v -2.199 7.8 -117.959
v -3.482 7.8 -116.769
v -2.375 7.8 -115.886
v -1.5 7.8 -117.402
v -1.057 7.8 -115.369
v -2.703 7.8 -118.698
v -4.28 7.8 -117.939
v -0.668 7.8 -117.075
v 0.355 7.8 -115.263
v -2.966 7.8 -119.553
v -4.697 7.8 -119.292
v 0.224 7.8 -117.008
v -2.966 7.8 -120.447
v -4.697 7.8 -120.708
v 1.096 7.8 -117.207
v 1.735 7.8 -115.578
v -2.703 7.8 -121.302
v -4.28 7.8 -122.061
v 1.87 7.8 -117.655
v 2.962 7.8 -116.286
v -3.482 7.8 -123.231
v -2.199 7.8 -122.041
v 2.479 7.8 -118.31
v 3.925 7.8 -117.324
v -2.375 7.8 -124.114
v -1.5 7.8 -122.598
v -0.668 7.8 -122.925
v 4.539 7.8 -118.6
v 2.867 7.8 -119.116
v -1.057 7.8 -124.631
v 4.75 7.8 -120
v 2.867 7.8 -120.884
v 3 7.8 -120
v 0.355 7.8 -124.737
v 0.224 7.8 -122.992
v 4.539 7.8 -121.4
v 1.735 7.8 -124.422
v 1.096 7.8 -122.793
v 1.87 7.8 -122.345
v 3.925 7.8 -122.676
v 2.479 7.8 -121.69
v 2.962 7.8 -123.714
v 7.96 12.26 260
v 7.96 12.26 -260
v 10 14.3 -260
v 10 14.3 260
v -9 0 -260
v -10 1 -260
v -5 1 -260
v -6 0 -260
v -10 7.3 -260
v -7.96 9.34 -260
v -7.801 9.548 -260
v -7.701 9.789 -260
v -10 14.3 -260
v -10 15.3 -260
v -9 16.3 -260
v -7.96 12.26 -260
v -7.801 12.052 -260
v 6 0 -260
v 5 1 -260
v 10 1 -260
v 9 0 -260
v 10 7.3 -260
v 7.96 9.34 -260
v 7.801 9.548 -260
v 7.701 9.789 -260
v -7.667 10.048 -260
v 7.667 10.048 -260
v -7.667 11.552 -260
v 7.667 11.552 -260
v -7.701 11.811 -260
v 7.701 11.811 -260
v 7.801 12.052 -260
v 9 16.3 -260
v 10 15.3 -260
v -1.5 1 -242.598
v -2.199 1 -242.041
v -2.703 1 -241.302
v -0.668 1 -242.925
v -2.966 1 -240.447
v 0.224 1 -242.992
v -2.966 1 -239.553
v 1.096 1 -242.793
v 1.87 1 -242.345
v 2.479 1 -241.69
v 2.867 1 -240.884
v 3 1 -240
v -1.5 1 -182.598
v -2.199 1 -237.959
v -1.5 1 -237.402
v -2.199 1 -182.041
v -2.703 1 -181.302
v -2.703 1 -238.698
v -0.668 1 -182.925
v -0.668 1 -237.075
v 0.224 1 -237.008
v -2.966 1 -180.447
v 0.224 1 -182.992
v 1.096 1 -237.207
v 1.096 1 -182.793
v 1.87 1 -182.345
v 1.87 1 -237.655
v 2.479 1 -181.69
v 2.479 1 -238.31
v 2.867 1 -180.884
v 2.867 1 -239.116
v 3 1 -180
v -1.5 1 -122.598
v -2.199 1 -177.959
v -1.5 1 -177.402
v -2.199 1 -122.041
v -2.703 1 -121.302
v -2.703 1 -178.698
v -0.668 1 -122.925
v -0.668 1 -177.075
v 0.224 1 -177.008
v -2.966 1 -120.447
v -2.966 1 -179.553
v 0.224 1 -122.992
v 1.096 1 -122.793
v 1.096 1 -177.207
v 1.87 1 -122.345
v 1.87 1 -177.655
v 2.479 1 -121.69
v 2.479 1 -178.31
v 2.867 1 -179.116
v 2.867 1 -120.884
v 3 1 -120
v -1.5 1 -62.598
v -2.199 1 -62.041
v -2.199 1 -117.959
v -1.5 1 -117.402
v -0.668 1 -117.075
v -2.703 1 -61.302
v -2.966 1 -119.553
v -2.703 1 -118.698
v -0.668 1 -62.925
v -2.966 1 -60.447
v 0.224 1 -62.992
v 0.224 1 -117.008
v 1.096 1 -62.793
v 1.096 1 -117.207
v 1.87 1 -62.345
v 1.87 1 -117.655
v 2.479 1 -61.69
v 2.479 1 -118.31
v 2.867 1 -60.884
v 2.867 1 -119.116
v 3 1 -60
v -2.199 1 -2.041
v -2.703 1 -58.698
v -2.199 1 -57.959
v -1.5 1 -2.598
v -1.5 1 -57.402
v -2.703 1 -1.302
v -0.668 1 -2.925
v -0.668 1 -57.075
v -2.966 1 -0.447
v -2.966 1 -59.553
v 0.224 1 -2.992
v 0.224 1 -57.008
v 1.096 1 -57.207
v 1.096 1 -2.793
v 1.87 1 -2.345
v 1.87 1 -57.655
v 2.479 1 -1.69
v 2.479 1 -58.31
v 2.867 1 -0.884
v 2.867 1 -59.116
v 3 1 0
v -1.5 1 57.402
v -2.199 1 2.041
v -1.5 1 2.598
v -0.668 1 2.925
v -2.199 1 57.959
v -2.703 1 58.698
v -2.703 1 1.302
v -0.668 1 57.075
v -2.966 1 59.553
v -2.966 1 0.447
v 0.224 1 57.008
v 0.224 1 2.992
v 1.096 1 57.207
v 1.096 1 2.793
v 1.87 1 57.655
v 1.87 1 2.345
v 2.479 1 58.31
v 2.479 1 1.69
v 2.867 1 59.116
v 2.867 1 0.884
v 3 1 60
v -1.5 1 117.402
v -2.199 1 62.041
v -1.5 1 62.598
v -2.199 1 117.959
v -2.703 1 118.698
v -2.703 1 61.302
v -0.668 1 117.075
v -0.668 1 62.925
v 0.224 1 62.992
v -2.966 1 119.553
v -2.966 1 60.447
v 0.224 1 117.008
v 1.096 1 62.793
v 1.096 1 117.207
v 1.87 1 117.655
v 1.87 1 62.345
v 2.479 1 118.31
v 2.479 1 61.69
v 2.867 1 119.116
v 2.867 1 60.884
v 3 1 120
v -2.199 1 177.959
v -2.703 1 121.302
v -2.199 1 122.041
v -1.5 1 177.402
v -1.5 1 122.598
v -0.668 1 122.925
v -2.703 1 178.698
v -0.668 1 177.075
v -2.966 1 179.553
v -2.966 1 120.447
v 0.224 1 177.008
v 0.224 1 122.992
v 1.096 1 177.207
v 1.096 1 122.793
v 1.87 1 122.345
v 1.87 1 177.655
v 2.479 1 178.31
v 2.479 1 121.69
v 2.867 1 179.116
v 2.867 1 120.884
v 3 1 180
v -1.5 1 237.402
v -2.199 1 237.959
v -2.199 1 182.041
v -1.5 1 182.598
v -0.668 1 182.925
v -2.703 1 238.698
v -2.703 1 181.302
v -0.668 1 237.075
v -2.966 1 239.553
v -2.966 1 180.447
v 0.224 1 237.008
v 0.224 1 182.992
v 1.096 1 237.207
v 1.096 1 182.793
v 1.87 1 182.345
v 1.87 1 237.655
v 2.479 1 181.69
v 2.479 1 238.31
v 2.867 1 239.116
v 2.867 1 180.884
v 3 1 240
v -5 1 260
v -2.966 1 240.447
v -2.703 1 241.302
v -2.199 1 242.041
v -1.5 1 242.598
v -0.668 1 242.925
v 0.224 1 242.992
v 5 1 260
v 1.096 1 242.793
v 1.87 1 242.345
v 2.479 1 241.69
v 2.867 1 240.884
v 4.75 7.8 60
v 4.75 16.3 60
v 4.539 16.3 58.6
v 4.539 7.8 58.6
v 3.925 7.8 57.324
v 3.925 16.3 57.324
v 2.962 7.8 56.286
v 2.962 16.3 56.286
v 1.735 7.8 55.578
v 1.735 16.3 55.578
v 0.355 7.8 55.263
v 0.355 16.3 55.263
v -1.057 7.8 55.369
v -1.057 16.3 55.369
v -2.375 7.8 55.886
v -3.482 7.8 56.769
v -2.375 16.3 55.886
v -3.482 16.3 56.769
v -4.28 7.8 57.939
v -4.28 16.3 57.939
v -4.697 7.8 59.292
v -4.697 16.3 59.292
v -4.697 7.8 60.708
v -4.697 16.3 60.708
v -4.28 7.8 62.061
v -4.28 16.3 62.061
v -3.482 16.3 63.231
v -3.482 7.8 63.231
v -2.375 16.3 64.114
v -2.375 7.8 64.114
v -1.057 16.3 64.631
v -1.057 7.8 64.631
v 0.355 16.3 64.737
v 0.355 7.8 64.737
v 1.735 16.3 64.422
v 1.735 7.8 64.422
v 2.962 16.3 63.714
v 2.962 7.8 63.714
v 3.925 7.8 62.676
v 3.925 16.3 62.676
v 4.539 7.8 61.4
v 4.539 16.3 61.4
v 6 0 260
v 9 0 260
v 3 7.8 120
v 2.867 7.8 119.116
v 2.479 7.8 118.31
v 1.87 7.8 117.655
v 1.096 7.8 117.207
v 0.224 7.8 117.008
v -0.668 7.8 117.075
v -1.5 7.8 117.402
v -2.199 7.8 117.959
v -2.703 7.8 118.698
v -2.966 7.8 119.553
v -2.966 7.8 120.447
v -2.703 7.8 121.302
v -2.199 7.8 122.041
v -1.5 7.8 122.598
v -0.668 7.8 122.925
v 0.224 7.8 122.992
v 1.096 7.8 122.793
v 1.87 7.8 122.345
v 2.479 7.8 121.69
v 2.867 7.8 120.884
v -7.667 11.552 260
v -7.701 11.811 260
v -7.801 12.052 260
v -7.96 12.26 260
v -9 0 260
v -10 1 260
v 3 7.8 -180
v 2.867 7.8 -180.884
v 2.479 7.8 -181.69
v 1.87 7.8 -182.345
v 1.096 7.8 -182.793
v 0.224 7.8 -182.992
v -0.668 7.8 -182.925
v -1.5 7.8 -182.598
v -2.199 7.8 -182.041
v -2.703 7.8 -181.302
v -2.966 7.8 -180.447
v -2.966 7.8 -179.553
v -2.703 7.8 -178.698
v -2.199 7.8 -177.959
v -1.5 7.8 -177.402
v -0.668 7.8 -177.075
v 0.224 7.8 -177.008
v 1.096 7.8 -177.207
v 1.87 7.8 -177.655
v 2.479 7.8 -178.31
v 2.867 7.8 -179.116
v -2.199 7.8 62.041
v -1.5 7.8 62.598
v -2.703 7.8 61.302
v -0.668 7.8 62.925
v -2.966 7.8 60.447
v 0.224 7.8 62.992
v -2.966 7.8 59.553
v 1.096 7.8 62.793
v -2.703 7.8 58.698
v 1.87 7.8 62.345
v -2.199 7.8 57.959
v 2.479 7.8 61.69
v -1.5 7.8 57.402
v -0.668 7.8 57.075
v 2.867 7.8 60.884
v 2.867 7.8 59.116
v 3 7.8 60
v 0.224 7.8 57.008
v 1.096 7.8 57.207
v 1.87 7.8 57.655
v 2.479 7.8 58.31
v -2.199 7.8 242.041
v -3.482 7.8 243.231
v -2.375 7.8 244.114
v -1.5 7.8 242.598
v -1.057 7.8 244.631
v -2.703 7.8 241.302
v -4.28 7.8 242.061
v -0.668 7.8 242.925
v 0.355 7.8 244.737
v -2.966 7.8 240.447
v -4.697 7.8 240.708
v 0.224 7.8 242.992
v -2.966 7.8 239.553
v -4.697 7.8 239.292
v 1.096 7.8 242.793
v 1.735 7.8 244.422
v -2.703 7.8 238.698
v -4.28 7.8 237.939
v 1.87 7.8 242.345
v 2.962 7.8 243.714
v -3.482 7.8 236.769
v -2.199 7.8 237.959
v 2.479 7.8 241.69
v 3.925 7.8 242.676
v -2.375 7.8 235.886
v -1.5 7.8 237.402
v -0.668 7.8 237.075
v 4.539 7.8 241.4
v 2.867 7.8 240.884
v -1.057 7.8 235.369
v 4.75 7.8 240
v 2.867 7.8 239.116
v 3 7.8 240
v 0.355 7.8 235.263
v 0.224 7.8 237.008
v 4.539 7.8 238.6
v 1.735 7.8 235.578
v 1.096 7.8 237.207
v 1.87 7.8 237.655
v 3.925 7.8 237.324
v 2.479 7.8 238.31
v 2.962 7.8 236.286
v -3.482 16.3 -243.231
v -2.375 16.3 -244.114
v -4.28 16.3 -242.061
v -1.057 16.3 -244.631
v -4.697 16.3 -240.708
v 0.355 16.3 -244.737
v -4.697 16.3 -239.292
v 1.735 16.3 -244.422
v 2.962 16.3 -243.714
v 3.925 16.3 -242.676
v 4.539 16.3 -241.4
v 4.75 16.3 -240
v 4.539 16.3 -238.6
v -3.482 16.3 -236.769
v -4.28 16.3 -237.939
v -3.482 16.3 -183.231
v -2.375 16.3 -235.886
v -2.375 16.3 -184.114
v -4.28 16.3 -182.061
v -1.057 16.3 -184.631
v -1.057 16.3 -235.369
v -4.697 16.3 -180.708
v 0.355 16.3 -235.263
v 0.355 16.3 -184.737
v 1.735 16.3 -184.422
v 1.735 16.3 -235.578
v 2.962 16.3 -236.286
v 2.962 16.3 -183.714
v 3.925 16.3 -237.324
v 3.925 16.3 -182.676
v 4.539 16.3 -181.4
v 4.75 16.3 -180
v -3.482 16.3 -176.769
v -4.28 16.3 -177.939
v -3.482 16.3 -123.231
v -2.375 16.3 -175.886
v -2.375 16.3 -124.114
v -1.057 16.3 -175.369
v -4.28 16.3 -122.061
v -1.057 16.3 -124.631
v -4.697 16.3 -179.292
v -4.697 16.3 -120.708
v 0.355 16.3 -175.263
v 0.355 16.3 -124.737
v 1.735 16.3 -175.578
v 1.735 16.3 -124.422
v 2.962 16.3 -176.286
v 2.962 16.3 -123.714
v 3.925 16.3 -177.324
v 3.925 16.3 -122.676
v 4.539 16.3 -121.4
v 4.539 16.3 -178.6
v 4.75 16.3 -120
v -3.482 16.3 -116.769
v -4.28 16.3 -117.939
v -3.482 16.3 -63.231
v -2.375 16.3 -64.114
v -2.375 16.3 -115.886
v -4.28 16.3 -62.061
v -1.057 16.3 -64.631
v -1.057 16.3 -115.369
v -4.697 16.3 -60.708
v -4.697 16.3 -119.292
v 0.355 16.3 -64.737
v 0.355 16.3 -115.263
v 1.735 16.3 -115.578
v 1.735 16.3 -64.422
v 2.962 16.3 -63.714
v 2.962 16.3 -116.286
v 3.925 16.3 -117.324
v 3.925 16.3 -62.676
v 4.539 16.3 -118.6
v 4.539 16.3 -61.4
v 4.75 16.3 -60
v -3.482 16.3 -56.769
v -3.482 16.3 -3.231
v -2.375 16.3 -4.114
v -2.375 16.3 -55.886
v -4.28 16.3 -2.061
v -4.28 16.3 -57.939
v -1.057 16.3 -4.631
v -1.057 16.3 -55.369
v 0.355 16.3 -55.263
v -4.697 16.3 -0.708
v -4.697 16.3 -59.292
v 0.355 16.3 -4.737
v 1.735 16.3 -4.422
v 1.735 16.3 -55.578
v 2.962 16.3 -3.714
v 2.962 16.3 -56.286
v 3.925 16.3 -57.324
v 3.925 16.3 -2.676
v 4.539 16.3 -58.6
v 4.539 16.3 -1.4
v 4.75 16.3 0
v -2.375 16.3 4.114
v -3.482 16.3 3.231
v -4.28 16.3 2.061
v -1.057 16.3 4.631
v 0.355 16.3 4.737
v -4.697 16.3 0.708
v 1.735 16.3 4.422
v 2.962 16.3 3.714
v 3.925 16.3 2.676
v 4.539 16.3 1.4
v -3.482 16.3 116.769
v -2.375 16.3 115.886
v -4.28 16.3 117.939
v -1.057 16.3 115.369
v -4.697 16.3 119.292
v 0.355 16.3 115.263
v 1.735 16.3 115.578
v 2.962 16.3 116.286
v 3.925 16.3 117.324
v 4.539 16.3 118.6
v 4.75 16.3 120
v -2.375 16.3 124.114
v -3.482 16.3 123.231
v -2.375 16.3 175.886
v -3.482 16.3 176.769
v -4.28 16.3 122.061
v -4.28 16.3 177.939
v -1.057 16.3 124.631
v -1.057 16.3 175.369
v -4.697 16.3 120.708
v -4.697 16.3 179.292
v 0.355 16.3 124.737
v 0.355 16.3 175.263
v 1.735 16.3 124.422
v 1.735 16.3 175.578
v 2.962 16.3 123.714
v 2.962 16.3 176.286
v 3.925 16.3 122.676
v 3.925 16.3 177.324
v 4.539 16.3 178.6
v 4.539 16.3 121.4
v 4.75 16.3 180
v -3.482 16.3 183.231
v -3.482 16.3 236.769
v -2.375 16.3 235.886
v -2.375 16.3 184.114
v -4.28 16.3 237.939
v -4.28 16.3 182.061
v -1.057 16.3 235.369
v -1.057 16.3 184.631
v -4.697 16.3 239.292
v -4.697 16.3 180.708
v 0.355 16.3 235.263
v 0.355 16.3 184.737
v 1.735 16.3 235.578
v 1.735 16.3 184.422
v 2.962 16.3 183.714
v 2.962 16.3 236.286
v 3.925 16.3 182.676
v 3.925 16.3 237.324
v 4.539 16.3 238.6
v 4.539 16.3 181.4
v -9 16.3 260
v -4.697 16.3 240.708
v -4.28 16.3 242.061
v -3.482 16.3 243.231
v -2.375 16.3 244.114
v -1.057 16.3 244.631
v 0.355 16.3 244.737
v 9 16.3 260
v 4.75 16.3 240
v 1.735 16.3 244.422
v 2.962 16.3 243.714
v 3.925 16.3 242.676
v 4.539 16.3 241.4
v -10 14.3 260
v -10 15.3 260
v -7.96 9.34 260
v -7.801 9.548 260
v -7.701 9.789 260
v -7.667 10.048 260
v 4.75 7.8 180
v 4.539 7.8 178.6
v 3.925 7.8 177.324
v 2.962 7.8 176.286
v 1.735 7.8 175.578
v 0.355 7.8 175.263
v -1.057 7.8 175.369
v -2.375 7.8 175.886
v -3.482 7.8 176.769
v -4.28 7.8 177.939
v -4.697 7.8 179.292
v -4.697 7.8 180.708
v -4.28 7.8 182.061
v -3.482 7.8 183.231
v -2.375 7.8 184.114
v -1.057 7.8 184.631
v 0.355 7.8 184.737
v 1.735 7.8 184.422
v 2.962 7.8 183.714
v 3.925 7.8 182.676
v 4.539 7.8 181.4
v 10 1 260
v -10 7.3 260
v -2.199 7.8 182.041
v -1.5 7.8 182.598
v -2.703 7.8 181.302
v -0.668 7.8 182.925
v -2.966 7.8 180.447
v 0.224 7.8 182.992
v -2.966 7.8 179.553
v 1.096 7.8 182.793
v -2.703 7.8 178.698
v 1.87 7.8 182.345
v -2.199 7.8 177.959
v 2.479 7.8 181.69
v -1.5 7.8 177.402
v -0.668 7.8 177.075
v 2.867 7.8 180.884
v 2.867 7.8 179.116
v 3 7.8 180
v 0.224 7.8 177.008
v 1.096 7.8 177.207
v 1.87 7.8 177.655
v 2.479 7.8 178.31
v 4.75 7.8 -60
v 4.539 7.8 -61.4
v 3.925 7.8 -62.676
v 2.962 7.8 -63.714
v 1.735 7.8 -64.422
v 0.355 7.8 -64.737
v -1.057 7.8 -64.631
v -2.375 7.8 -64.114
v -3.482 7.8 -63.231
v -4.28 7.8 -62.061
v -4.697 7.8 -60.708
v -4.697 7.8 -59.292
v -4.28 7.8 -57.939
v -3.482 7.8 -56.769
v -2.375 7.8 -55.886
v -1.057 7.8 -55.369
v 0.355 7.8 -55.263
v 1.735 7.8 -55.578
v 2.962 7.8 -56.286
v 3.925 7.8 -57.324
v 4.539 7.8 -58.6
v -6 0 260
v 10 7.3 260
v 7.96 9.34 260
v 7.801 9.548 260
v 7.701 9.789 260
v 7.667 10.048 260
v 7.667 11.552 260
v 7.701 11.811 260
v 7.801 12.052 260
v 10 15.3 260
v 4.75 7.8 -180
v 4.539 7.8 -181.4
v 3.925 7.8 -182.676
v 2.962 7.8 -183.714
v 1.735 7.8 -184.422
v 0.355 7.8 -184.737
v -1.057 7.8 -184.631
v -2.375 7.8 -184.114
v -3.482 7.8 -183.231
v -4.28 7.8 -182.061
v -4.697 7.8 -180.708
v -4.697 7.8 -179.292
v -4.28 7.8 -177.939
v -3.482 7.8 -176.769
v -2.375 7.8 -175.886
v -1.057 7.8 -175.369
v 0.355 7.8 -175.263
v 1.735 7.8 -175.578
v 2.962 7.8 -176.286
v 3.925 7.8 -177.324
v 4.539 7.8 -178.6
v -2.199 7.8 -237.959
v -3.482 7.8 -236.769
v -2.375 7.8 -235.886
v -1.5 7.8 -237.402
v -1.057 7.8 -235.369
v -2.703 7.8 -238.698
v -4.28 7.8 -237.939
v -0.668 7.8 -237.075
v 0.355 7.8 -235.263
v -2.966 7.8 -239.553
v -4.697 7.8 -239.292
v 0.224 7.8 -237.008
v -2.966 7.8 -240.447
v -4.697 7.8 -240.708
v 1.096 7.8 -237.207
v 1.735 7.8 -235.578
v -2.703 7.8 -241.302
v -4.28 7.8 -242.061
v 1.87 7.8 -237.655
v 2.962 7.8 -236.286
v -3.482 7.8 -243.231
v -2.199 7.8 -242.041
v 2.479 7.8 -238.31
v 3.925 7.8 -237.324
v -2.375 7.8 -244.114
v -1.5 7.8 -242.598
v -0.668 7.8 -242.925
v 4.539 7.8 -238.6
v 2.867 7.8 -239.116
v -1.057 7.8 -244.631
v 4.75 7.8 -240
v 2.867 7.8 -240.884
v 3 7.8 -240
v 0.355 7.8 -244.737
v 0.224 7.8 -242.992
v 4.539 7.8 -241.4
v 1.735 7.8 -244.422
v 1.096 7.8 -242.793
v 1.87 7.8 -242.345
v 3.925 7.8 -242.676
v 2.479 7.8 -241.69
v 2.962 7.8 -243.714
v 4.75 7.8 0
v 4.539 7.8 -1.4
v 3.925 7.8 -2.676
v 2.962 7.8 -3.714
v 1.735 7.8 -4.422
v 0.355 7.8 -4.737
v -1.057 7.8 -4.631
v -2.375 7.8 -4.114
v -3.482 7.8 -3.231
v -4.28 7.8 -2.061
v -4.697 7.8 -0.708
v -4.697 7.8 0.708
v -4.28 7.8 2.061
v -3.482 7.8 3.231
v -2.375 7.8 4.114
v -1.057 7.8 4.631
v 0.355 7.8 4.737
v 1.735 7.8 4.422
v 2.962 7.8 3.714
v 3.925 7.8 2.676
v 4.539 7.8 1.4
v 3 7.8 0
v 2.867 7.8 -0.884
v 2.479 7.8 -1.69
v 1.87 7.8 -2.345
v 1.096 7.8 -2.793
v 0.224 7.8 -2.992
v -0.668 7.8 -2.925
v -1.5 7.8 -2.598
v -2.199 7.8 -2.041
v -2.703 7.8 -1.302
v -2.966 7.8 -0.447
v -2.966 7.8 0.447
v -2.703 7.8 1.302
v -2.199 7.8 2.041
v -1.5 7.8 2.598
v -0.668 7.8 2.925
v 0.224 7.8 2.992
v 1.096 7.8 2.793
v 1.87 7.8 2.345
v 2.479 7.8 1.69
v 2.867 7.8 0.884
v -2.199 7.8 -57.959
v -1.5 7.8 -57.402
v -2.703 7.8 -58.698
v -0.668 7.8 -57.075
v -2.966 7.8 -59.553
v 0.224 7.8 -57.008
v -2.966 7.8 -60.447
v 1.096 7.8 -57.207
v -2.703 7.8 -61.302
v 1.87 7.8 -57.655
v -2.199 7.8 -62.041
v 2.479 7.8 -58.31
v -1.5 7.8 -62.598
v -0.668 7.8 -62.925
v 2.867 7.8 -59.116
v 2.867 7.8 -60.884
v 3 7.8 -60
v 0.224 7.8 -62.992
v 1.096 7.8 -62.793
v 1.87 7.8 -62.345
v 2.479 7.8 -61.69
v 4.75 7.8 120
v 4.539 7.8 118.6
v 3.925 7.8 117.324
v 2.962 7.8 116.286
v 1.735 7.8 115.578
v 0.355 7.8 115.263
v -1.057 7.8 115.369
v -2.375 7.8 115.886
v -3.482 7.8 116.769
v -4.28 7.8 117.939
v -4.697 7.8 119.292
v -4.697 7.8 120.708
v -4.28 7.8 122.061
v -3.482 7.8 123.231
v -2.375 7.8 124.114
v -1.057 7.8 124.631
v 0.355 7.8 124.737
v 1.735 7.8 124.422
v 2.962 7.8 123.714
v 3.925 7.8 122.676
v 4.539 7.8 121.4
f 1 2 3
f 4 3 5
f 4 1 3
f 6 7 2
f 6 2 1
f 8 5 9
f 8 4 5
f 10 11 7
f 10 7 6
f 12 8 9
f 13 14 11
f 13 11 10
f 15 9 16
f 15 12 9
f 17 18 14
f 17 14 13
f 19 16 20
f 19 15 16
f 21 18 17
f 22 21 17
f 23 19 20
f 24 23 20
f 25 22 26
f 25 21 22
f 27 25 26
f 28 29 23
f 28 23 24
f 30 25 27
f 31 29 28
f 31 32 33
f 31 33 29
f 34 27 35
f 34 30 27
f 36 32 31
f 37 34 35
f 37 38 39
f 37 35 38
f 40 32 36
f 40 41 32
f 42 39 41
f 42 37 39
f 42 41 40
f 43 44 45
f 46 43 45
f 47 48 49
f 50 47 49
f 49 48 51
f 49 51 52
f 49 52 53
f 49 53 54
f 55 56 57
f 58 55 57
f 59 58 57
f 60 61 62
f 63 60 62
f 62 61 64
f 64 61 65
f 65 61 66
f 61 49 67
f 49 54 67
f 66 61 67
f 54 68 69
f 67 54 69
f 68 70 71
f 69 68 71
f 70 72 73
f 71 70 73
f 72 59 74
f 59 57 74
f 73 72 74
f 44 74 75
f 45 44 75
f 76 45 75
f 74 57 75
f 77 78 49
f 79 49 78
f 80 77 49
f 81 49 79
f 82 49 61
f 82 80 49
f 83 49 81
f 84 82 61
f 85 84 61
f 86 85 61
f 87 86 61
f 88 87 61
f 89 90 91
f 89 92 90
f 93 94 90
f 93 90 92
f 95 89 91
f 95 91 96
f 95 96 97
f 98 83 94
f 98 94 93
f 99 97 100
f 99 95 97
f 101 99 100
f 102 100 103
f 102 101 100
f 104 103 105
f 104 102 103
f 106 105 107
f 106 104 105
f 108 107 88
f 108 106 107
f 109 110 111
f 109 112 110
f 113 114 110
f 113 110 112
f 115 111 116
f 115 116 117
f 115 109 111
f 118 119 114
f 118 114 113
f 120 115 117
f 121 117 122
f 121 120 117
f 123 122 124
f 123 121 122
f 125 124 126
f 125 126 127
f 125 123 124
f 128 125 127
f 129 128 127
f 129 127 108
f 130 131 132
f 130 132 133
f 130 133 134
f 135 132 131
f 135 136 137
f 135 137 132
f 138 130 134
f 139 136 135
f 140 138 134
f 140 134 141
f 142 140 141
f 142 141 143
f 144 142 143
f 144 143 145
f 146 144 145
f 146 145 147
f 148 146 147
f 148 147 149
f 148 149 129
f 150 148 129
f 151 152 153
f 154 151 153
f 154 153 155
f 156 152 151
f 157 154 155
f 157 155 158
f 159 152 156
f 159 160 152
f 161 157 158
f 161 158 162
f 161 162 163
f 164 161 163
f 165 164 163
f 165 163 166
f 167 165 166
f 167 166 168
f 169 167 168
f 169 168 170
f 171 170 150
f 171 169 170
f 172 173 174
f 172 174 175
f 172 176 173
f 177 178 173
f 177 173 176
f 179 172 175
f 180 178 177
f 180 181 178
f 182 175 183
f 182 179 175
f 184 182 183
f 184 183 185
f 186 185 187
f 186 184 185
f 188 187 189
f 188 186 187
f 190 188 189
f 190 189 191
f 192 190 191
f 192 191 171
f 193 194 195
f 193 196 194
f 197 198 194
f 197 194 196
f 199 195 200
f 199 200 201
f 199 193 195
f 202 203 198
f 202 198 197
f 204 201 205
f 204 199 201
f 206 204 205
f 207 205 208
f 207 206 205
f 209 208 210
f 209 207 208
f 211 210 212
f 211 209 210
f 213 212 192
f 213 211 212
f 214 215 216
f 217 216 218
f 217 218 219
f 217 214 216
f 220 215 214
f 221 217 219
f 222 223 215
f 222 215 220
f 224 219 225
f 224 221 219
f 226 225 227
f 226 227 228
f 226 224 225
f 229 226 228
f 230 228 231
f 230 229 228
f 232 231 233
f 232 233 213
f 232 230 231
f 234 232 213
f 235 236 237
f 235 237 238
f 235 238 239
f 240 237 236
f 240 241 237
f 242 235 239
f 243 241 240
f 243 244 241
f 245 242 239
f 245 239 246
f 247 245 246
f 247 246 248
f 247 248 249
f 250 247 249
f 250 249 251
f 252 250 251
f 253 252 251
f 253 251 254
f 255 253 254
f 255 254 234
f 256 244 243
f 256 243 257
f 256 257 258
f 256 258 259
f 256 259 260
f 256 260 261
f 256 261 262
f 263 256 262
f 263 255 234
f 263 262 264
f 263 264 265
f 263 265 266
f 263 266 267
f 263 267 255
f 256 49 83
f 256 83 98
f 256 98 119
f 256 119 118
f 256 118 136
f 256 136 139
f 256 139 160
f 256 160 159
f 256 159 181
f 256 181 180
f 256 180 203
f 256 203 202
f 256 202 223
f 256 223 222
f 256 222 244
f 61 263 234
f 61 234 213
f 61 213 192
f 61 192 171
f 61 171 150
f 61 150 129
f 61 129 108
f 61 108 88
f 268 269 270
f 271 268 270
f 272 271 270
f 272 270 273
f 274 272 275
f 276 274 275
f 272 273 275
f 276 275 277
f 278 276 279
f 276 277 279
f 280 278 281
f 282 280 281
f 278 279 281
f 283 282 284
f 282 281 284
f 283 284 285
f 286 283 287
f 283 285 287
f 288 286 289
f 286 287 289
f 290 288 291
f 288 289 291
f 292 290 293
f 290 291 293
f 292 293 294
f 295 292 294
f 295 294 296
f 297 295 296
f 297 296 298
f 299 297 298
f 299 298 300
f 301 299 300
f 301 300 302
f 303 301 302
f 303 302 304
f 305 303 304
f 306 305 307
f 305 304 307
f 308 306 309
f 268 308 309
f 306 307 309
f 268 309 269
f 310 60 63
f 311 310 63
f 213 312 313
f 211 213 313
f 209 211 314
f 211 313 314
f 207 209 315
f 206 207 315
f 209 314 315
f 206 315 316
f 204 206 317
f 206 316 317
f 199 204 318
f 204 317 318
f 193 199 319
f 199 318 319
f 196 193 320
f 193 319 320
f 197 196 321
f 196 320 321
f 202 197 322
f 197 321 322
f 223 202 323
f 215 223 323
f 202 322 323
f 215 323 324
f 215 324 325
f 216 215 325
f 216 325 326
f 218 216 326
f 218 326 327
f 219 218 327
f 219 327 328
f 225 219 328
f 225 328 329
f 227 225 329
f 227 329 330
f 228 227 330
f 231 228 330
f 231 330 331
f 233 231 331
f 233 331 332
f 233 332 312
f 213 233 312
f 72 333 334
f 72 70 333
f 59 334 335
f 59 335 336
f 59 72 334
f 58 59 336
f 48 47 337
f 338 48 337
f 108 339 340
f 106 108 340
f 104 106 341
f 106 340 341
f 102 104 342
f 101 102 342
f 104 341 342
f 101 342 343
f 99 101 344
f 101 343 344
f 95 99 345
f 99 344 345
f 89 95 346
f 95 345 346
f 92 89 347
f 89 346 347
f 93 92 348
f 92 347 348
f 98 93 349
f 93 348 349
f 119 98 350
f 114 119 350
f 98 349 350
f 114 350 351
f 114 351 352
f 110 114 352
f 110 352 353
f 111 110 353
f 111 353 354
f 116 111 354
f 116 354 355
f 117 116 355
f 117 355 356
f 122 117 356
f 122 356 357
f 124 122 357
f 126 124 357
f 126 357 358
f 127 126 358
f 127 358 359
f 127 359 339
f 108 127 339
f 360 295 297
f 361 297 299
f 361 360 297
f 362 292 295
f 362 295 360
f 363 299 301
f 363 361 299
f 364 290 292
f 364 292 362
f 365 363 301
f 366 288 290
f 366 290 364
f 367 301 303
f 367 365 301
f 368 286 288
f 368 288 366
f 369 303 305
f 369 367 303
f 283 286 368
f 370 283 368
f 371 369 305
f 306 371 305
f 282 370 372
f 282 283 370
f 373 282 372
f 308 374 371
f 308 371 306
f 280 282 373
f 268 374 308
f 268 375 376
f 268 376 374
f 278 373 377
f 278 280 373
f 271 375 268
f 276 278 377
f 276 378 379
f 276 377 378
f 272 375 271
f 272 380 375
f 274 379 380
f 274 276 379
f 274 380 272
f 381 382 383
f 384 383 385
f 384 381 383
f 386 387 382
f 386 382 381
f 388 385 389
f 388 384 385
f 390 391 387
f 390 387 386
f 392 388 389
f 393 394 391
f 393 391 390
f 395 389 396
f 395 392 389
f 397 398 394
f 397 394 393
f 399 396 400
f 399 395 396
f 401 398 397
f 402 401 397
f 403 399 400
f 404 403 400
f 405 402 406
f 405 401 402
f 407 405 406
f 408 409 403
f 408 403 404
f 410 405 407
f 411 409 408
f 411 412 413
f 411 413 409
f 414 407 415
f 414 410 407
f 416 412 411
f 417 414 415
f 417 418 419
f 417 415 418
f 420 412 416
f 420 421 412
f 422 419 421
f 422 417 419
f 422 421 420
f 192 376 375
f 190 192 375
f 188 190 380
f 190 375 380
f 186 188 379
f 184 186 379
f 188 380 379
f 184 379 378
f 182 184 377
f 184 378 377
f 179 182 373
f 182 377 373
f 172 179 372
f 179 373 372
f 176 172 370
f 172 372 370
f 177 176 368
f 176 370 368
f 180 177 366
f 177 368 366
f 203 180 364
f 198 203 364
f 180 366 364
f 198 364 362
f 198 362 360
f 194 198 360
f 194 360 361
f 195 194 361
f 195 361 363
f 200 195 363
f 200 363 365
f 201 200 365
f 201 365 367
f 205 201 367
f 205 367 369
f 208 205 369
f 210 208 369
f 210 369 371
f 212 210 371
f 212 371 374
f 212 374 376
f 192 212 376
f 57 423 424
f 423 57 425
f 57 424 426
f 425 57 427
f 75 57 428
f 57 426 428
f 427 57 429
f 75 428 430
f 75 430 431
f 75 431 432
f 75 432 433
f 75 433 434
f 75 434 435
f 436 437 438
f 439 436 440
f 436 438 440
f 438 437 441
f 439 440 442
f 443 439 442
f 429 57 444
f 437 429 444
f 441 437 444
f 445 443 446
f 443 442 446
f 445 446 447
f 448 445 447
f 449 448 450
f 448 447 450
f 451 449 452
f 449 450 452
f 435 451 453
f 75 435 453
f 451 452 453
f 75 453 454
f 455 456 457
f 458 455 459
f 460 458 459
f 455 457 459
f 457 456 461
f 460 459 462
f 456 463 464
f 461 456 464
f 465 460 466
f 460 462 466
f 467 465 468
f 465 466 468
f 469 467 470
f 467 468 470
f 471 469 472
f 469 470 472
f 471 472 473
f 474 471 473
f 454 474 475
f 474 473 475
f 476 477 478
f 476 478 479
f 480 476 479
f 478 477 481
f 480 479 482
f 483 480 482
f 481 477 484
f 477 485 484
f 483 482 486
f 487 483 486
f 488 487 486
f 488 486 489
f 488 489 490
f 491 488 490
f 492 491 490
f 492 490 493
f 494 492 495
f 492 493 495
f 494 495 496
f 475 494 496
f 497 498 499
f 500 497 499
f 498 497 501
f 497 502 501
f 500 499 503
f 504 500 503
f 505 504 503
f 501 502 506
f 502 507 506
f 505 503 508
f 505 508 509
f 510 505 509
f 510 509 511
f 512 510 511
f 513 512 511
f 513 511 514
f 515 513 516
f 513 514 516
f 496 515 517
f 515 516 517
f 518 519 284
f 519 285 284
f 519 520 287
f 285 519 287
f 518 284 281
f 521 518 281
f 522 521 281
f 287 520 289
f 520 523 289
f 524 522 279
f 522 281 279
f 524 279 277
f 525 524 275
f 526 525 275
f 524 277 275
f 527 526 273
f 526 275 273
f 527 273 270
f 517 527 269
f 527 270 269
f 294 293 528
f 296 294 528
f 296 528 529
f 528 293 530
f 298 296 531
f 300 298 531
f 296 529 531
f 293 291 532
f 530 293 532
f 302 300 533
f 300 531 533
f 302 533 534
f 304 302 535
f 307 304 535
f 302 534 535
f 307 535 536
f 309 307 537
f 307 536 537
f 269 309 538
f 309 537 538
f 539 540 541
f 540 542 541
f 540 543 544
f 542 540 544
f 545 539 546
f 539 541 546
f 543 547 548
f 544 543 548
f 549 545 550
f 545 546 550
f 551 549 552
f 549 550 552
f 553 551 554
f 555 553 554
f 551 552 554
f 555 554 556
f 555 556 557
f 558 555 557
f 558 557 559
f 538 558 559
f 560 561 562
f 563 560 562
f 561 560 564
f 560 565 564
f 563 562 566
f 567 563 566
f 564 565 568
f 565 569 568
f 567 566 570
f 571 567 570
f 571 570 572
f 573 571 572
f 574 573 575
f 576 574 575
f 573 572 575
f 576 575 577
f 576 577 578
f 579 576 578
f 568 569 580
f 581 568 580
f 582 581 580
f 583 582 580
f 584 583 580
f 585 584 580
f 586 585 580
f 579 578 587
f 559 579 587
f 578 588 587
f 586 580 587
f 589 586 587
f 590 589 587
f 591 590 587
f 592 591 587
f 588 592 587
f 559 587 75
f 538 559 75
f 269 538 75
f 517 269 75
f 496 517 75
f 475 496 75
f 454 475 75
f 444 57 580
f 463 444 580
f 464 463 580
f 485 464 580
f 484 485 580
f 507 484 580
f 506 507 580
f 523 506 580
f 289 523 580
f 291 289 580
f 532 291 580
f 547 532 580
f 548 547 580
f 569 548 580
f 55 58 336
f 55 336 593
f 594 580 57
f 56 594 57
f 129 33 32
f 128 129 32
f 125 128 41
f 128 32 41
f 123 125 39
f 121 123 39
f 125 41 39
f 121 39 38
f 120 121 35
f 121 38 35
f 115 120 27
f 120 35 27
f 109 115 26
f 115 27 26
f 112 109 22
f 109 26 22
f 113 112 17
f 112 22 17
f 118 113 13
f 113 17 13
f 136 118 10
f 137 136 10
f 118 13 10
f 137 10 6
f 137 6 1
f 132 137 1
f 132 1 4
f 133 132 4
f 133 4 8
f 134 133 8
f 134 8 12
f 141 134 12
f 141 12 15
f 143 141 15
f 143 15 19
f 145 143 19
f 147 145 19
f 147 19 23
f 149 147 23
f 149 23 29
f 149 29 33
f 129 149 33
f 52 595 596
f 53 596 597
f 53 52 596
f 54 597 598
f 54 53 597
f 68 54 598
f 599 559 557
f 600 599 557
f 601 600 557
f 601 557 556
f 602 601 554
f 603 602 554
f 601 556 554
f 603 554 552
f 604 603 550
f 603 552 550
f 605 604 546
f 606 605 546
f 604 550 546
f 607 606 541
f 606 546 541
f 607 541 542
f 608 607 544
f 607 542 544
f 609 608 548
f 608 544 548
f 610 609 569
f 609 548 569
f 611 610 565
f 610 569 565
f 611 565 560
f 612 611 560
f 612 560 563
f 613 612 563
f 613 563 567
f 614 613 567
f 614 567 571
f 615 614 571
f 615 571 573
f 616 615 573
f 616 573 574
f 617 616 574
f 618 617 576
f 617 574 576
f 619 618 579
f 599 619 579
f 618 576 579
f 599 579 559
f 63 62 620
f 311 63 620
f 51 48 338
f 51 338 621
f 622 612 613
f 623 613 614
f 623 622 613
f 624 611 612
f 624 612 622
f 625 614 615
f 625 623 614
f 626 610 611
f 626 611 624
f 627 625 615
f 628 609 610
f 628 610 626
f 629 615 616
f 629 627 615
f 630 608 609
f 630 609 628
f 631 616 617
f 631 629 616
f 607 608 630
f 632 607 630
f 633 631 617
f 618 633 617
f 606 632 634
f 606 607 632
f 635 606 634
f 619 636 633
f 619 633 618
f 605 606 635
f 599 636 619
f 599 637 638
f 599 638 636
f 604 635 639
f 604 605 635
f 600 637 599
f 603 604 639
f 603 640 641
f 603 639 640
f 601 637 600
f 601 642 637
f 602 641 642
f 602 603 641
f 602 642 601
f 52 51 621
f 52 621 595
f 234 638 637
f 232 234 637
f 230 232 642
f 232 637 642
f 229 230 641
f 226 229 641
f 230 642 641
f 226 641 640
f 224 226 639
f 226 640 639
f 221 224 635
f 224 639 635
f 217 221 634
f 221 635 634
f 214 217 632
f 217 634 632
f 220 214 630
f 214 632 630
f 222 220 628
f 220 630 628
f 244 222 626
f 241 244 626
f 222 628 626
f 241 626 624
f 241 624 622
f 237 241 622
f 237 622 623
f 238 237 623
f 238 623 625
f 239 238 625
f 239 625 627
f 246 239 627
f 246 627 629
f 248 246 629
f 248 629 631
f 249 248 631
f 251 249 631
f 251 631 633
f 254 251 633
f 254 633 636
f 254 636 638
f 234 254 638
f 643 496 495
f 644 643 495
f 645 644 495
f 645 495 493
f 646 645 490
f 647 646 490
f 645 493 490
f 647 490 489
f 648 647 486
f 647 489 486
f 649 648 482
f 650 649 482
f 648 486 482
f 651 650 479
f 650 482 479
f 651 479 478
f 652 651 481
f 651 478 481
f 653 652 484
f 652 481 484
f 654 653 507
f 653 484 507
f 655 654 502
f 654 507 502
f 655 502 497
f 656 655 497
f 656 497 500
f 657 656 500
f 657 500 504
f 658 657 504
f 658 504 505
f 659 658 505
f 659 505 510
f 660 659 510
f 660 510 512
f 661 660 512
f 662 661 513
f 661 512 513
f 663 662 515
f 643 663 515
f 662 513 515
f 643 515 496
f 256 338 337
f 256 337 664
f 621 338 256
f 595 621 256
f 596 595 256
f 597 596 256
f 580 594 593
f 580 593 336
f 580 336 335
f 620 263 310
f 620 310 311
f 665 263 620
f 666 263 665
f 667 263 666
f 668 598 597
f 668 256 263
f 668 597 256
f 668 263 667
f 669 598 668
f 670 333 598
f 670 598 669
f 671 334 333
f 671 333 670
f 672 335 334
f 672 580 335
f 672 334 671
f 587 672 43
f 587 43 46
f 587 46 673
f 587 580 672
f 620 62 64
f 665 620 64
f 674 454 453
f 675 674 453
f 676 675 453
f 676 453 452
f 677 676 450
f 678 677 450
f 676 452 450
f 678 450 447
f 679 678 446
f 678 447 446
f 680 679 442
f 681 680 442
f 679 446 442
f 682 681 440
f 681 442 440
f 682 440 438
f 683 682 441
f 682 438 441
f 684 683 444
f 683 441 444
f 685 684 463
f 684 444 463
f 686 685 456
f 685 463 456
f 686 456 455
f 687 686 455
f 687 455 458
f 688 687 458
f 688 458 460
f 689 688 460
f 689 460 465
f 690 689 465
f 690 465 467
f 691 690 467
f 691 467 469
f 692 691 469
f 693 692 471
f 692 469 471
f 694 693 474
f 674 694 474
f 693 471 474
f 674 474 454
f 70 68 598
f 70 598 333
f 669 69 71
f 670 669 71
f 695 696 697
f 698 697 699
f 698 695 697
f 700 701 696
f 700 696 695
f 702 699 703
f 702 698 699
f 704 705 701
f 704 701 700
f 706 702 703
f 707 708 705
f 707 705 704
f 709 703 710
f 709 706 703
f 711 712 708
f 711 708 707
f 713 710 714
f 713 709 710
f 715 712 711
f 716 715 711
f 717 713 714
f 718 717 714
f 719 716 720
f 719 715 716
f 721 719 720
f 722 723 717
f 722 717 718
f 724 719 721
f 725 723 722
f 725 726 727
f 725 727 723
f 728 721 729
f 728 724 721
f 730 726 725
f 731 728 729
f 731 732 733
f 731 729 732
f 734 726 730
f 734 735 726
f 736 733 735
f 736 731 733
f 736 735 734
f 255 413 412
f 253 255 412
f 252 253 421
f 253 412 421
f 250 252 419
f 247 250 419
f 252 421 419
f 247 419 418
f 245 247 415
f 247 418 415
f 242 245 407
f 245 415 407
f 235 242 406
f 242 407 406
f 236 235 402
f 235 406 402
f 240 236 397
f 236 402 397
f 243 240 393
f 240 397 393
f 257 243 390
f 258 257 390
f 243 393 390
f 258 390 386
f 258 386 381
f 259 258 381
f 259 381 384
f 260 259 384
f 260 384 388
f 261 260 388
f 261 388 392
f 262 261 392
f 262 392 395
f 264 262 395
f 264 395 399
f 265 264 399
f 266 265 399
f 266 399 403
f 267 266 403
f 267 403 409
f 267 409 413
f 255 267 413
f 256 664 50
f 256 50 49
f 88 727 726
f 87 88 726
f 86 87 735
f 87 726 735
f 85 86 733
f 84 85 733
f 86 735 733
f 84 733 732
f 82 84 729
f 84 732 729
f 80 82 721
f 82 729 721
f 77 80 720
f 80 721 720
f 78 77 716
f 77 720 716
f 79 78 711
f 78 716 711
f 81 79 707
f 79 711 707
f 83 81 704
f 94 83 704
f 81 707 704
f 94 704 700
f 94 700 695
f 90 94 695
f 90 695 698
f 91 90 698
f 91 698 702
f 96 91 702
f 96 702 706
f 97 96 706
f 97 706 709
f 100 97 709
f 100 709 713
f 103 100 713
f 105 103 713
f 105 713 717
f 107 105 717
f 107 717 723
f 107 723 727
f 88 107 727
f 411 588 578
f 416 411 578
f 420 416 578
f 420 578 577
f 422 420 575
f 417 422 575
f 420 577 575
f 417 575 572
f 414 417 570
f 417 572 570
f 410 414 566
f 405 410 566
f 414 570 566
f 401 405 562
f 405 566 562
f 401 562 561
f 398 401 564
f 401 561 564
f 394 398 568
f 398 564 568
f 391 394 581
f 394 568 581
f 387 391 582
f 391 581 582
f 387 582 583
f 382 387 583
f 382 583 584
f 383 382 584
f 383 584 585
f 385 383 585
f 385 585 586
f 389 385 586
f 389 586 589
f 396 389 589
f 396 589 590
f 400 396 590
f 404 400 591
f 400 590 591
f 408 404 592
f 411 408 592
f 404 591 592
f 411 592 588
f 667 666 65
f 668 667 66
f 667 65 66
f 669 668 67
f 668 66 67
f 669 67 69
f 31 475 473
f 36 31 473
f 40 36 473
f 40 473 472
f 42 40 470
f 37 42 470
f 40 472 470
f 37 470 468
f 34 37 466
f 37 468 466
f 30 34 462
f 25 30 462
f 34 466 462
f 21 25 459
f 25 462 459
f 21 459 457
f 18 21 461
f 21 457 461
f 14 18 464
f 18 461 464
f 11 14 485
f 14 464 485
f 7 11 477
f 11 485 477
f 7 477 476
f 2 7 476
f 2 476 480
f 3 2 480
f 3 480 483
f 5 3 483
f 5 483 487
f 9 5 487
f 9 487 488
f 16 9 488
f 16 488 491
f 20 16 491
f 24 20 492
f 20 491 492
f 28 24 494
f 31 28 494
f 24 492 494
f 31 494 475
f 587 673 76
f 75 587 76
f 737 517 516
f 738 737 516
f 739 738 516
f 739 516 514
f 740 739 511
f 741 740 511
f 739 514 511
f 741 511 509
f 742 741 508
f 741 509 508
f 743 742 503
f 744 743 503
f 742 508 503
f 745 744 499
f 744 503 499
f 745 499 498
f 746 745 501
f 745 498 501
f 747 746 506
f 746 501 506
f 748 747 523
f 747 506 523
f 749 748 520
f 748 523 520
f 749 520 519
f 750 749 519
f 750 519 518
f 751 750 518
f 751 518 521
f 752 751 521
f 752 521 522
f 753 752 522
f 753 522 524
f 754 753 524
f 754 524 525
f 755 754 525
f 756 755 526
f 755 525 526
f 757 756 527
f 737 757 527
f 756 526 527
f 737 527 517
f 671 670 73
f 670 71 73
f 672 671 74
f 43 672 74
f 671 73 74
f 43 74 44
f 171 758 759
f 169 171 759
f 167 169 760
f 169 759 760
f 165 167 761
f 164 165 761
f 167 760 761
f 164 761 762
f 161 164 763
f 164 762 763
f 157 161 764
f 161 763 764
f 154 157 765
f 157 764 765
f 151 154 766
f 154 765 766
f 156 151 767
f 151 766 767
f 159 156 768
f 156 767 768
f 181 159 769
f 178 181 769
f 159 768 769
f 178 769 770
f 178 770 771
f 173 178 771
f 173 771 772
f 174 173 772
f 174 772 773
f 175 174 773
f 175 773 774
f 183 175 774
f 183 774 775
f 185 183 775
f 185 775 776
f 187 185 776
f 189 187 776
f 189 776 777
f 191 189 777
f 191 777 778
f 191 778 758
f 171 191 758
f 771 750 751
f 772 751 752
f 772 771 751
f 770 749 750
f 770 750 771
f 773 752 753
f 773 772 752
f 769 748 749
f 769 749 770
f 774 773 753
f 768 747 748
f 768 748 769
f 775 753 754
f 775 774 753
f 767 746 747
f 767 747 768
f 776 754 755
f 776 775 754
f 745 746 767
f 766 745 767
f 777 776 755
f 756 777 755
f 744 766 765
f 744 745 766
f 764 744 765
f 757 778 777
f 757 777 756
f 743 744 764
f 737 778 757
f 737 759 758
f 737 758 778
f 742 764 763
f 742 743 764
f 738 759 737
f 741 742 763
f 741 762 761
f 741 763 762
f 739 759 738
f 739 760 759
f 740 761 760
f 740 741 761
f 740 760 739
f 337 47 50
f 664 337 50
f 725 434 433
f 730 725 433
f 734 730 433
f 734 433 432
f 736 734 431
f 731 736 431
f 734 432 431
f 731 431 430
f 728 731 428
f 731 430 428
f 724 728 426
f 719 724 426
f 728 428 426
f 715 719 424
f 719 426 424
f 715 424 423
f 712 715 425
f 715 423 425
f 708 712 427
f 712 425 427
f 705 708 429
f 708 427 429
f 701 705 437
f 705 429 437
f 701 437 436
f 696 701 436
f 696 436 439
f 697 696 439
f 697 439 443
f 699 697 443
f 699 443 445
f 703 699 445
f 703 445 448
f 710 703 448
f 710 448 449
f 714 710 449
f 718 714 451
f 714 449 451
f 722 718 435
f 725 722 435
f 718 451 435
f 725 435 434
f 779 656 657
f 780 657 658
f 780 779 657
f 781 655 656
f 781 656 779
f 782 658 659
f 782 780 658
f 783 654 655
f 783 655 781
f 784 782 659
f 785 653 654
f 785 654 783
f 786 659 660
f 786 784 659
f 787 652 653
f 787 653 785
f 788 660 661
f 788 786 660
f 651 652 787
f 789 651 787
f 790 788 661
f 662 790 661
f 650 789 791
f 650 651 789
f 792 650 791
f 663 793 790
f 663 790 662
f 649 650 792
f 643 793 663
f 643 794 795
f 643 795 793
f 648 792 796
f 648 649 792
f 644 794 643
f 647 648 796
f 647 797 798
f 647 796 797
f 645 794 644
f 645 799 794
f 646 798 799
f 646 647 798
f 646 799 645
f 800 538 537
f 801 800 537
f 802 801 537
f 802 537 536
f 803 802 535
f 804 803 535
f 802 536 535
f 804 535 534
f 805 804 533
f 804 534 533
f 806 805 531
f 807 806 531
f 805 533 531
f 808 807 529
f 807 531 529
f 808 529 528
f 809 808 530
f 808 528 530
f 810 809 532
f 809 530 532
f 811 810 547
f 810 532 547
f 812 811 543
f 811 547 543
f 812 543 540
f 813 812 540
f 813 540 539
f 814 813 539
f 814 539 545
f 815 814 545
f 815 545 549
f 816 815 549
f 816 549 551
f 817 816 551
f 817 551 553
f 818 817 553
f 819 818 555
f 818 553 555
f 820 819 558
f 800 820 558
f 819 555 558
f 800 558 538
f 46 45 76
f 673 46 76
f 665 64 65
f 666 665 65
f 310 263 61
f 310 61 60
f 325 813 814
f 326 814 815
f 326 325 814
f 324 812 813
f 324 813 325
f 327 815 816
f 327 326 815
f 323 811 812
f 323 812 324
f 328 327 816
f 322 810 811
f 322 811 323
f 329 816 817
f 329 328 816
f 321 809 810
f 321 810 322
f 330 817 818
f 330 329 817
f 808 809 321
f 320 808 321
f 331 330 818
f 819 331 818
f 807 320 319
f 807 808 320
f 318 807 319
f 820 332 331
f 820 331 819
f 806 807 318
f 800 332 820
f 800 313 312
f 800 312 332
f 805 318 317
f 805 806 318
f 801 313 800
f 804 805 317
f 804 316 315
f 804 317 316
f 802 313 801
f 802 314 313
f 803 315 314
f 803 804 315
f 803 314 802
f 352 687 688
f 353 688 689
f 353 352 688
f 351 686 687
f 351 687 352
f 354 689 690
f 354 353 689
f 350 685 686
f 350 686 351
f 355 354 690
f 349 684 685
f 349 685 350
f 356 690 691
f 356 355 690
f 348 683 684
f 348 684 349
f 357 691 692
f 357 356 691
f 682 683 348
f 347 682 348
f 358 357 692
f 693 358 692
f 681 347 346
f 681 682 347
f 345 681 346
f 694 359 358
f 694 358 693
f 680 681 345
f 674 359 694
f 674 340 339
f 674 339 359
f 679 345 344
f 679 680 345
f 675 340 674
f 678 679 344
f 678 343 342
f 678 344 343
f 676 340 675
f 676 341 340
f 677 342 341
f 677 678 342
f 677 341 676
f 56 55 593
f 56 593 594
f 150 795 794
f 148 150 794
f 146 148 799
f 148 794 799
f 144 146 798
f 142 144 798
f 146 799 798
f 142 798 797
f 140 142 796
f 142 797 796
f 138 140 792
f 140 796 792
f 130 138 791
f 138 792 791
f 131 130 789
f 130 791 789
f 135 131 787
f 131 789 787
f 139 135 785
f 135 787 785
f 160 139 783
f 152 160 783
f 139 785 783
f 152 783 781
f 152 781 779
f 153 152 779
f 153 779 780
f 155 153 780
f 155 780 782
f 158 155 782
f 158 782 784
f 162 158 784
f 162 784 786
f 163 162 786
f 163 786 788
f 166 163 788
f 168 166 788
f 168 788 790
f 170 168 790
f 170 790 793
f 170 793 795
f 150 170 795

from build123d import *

# Parameters (mm, degrees)
SKETCH1_W           = 20
SKETCH1_H           = 16.3
BOSS_EXTRUDE1_DEPTH = 260
CUT_EXTRUDE1_DEPTH  = 521
CHAMFER1_SIZE       = 1
FILLET1_R           = 1
CUT_EXTRUDE2_DEPTH  = 521
SKETCH4_R           = 4.75
SKETCH4_R_2         = 3
CUT_EXTRUDE3_DEPTH  = 8.5
SKETCH4_2_R         = 3
CUT_EXTRUDE4_DEPTH  = 17.3
LPATTERN1_COUNT     = 9
LPATTERN1_PITCH     = 60


with BuildPart() as part:
    # Sketch1 → Boss-Extrude1 (new body, symmetric)
    with BuildSketch(Plane.XY):
        with Locations((0, 8.15)):
            Rectangle(SKETCH1_W, SKETCH1_H)
    extrude(amount=BOSS_EXTRUDE1_DEPTH, both=True)

    # Sketch2 → Cut-Extrude1 (cut, through all)
    with BuildSketch(Plane.XY.offset(260)):
        Polygon((-10, 14.3), (-10, 7.3), (-7.666666667, 9.633333333), (-7.666666667, 11.966666667), align=None)
        Polygon((7.666666667, 11.966666667), (10, 14.3), (10, 7.3), (7.666666667, 9.633333333), align=None)
    extrude(amount=-CUT_EXTRUDE1_DEPTH, mode=Mode.SUBTRACT)

    # Chamfer1
    chamfer1_edges = [part.edges().sort_by_distance(p)[0] for p in [
        (-10, 16.3, 0),
        (10, 16.3, 0),
        (10, 0, 0),
        (-10, 0, 0),
    ]]
    chamfer(chamfer1_edges, length=CHAMFER1_SIZE)

    # Fillet1
    fillet1_edges = [part.edges().sort_by_distance(p)[0] for p in [
        (-7.666666667, 11.966666667, 0),
        (-7.666666667, 9.633333333, 0),
        (7.666666667, 9.633333333, 0),
        (7.666666667, 11.966666667, 0),
    ]]
    fillet(fillet1_edges, radius=FILLET1_R)

    # Sketch3 → Cut-Extrude2 (cut, through all)
    with BuildSketch(Plane.XY.offset(260)):
        Polygon((-6, 0), (-5, 1), (5, 1), (6, 0), align=None)
    extrude(amount=-CUT_EXTRUDE2_DEPTH, mode=Mode.SUBTRACT)

    # Sketch4 → Cut-Extrude3 (cut)
    with BuildSketch(Plane(origin=(0, 16.3, 0), x_dir=(1, 0, 0), z_dir=(0, 1, 0))):
        with Locations((0, -240)):
            Circle(SKETCH4_R)
        with Locations((0, -240)):
            Circle(SKETCH4_R_2, mode=Mode.SUBTRACT)
    cut_extrude3 = extrude(amount=-CUT_EXTRUDE3_DEPTH, mode=Mode.SUBTRACT)

    # Sketch4_2 → Cut-Extrude4 (cut, through all)
    with BuildSketch(Plane(origin=(0, 16.3, 0), x_dir=(1, 0, 0), z_dir=(0, 1, 0))):
        with Locations((0, -240)):
            Circle(SKETCH4_2_R)
    cut_extrude4 = extrude(amount=-CUT_EXTRUDE4_DEPTH, mode=Mode.SUBTRACT)

    # LPattern1: Cut-Extrude3, Cut-Extrude4 ×9
    with Locations(*[(0, 0, -i * LPATTERN1_PITCH) for i in range(1, LPATTERN1_COUNT)]):
        add(cut_extrude3, mode=Mode.SUBTRACT)
        add(cut_extrude4, mode=Mode.SUBTRACT)


solid = part.part
